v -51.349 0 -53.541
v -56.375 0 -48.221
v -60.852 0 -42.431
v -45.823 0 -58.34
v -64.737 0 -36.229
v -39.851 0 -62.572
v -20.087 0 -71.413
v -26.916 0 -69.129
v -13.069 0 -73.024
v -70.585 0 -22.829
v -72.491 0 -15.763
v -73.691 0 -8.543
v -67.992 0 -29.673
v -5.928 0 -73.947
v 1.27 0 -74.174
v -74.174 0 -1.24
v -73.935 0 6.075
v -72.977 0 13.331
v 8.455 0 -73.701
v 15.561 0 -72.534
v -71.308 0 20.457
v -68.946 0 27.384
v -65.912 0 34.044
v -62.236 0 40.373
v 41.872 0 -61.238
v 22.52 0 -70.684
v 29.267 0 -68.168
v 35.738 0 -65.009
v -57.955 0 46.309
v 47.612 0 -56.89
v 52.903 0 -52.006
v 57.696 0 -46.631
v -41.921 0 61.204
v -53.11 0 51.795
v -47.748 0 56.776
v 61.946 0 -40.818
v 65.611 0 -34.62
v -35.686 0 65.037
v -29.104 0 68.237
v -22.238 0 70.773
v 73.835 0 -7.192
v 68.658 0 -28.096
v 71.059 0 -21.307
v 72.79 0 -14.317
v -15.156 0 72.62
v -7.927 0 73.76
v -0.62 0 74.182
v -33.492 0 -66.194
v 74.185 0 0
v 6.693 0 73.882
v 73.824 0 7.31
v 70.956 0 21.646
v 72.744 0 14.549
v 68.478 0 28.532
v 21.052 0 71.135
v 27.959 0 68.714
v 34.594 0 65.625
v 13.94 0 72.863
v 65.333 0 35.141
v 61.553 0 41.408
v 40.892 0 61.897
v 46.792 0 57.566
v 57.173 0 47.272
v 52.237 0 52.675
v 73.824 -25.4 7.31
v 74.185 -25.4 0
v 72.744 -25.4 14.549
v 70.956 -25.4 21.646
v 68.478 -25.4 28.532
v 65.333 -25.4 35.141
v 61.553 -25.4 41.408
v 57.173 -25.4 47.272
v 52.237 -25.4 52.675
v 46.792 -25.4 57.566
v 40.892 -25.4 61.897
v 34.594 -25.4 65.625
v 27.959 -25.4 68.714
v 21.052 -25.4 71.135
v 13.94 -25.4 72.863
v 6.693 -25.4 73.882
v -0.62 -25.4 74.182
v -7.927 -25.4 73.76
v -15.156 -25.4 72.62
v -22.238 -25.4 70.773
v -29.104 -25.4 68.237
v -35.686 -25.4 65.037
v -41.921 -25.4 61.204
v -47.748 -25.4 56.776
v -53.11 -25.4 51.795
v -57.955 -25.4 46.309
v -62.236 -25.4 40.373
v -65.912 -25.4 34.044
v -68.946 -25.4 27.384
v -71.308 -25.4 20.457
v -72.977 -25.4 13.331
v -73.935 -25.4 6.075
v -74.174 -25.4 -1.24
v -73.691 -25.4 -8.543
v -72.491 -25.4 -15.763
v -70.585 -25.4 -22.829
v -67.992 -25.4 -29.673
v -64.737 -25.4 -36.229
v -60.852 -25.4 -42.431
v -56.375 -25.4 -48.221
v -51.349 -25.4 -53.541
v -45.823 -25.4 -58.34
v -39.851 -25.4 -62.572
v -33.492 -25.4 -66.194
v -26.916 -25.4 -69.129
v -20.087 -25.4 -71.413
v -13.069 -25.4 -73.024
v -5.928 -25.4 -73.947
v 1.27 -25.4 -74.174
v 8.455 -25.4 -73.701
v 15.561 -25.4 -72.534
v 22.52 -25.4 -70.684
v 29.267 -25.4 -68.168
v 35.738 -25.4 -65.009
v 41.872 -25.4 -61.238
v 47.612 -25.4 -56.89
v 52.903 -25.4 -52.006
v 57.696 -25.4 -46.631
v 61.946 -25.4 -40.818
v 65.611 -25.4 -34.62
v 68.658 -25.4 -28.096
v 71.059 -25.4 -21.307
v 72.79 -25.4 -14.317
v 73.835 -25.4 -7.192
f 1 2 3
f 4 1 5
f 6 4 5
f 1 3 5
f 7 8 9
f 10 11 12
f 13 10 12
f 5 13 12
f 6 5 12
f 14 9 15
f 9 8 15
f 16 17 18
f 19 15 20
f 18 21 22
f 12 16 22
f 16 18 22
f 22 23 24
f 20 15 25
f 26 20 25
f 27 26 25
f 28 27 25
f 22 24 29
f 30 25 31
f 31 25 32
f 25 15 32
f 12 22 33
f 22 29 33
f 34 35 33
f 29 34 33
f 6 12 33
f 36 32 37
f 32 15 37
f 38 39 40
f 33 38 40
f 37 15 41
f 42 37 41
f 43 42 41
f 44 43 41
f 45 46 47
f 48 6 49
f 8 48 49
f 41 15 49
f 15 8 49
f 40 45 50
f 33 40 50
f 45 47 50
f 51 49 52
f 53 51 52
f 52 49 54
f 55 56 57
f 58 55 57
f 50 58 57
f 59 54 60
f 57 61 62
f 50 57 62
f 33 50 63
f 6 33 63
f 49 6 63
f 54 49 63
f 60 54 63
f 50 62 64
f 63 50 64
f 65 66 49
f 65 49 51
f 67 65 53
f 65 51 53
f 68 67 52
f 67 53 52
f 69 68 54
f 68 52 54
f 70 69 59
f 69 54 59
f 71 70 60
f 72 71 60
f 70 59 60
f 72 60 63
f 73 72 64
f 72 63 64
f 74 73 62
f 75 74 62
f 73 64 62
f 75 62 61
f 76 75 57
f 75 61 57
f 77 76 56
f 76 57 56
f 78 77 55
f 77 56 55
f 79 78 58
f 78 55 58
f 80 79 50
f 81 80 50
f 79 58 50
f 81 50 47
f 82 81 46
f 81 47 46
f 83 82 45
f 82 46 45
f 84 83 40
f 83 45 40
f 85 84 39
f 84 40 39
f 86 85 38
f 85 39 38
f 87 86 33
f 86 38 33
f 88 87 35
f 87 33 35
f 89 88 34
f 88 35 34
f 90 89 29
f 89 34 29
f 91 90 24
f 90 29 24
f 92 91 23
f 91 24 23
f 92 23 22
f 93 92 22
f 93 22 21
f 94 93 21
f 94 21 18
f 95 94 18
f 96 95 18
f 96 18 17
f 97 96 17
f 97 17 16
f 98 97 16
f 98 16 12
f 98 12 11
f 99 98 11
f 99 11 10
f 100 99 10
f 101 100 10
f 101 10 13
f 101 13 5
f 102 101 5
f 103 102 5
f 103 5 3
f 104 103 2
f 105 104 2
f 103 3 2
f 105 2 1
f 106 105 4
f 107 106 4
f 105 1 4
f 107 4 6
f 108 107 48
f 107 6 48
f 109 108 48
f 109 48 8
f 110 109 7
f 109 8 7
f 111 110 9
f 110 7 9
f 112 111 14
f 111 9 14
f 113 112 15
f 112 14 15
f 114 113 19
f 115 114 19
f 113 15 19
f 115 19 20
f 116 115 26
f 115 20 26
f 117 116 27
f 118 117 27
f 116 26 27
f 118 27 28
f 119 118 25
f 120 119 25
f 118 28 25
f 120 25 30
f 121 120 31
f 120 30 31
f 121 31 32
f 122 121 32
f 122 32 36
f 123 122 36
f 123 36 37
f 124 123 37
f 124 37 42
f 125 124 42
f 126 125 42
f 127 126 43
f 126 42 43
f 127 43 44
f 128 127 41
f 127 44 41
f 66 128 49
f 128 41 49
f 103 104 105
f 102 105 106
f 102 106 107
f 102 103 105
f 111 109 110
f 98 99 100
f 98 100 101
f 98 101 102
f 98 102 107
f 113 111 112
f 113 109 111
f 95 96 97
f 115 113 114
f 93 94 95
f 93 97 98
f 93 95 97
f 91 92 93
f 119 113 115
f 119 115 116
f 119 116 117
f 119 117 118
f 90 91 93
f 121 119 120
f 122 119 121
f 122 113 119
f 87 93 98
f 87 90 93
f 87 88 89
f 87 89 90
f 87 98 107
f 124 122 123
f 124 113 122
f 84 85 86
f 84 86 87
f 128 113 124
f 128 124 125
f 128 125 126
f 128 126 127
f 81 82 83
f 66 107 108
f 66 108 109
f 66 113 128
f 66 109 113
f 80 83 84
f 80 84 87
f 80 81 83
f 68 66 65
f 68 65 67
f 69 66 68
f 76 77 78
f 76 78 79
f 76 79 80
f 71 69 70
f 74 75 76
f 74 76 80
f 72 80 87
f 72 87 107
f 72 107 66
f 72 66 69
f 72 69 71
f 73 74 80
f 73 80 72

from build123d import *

# Parameters (mm, degrees)
F1_DEPTH = 25.4
F0_W     = 2.0122602582
F0_H     = 9.6141556278
F0_W_2   = 9.3905702233
F0_H_2   = 4.6952851117
F0_H_3   = 17.2160472721
F0_W_3   = 2.6830211282
F0_H_4   = 3.1301882118
F0_W_4   = 1.7886832356
F0_H_5   = 10.0613348186


with BuildPart() as f1:
    # F0 (on Front) → F1 (new body)
    with BuildSketch(Plane.XZ):
        with BuildLine():
            ThreePointArc((74.1845954161, 0), (-38.8508509686, 63.1978288873), (-33.4918178247, -66.1940506076))
            ThreePointArc((-33.4918178247, -66.1940506076), (38.8508509686, -63.1978288873), (74.1845954161, 0))
        make_face()
        with BuildLine():
            ThreePointArc((53.2162221936, 0), (27.8696069711, -45.3348796385), (-24.0253115762, -47.4842153586))
            ThreePointArc((-24.0253115762, -47.4842153586), (-27.8696069711, 45.3348796385), (53.2162221936, 0))
        make_face(mode=Mode.SUBTRACT)
        with BuildLine():
            ThreePointArc((53.2162221936, 0), (-27.8696069711, 45.3348796385), (-24.0253115762, -47.4842153586))
            ThreePointArc((-24.0253115762, -47.4842153586), (27.8696069711, -45.3348796385), (53.2162221936, 0))
        make_face()
        with BuildLine():
            ThreePointArc((40.3185295406, 0), (21.1150195491, -34.3473401263), (-18.2024426872, -35.9757543984))
            ThreePointArc((-18.2024426872, -35.9757543984), (-21.1150195491, 34.3473401263), (40.3185295406, 0))
        make_face(mode=Mode.SUBTRACT)
        with BuildLine():
            ThreePointArc((40.3185295406, 0), (-21.1150195491, 34.3473401263), (-18.2024426872, -35.9757543984))
            ThreePointArc((-18.2024426872, -35.9757543984), (21.1150195491, -34.3473401263), (40.3185295406, 0))
        make_face()
        with BuildLine():
            ThreePointArc((30.8835030596, 0), (16.1738480614, -26.3096446216), (-13.9428496234, -27.5569901406))
            ThreePointArc((-13.9428496234, -27.5569901406), (-16.1738480614, 26.3096446216), (30.8835030596, 0))
        make_face(mode=Mode.SUBTRACT)
        with BuildLine():
            ThreePointArc((30.8835030596, 0), (-16.1738480614, 26.3096446216), (-13.9428496234, -27.5569901406))
            ThreePointArc((-13.9428496234, -27.5569901406), (16.1738480614, -26.3096446216), (30.8835030596, 0))
        make_face()
        with BuildLine():
            ThreePointArc((23.2248742524, 0), (12.1629850953, -19.7852616261), (-10.4852395986, -20.723284841))
            ThreePointArc((-10.4852395986, -20.723284841), (-12.1629850953, 19.7852616261), (23.2248742524, 0))
        make_face(mode=Mode.SUBTRACT)
        with BuildLine():
            ThreePointArc((23.2248742524, 0), (-12.1629850953, 19.7852616261), (-10.4852395986, -20.723284841))
            ThreePointArc((-10.4852395986, -20.723284841), (12.1629850953, -19.7852616261), (23.2248742524, 0))
        make_face()
        with BuildLine():
            ThreePointArc((17.4618084215, 0), (9.1448381274, -14.8757080158), (-7.8834116876, -15.5809683111))
            ThreePointArc((-7.8834116876, -15.5809683111), (-9.1448381274, 14.8757080158), (17.4618084215, 0))
        make_face(mode=Mode.SUBTRACT)
        with BuildLine():
            ThreePointArc((17.4618084215, 0), (-9.1448381274, 14.8757080158), (-7.8834116876, -15.5809683111))
            ThreePointArc((-7.8834116876, -15.5809683111), (9.1448381274, -14.8757080158), (17.4618084215, 0))
        make_face()
        with BuildLine():
            ThreePointArc((13.1806981516, 0), (6.902798845, -11.2286317898), (-5.9506362314, -11.760983471))
            ThreePointArc((-5.9506362314, -11.760983471), (-6.902798845, 11.2286317898), (13.1806981516, 0))
        make_face(mode=Mode.SUBTRACT)
        with BuildLine():
            ThreePointArc((13.1806981516, 0), (-6.902798845, 11.2286317898), (-5.9506362314, -11.760983471))
            ThreePointArc((-5.9506362314, -11.760983471), (6.902798845, -11.2286317898), (13.1806981516, 0))
        make_face()
        with BuildLine():
            ThreePointArc((-4.1793532864, -8.2601763927), (-4.8480925259, 7.8862859948), (9.2572948495, 0))
            ThreePointArc((9.2572948495, 0), (4.8480925259, -7.8862859948), (-4.1793532864, -8.2601763927))
        make_face(mode=Mode.SUBTRACT)
        with BuildLine():
            ThreePointArc((-4.1793532864, -8.2601763927), (4.8480925259, -7.8862859948), (9.2572948495, 0))
            ThreePointArc((9.2572948495, 0), (-4.8480925259, 7.8862859948), (-4.1793532864, -8.2601763927))
        make_face()
        with BuildLine():
            ThreePointArc((6.7578094068, 0), (3.5390992519, -5.7569752877), (-3.0509207508, -6.0299146387))
            ThreePointArc((-3.0509207508, -6.0299146387), (-3.5390992519, 5.7569752877), (6.7578094068, 0))
        make_face(mode=Mode.SUBTRACT)
        with BuildLine():
            ThreePointArc((6.7578094068, 0), (-3.5390992519, 5.7569752877), (-3.0509207508, -6.0299146387))
            ThreePointArc((-3.0509207508, -6.0299146387), (3.5390992519, -5.7569752877), (6.7578094068, 0))
        make_face()
        with BuildLine():
            ThreePointArc((5.0579216156, 0), (2.648859346, -4.3088415188), (-2.2834793176, -4.5131245579))
            ThreePointArc((-2.2834793176, -4.5131245579), (-2.648859346, 4.3088415188), (5.0579216156, 0))
        make_face(mode=Mode.SUBTRACT)
        with BuildLine():
            ThreePointArc((5.0579216156, 0), (-2.648859346, 4.3088415188), (-2.2834793176, -4.5131245579))
            ThreePointArc((-2.2834793176, -4.5131245579), (2.648859346, -4.3088415188), (5.0579216156, 0))
        make_face()
        with BuildLine():
            ThreePointArc((2.9671045807, 0), (1.5538878015, -2.5276752745), (-1.3395466475, -2.6475128653))
            ThreePointArc((-1.3395466475, -2.6475128653), (-1.5538878015, 2.5276752745), (2.9671045807, 0))
        make_face(mode=Mode.SUBTRACT)
        with BuildLine():
            ThreePointArc((2.9671045807, 0), (-1.5538878015, 2.5276752745), (-1.3395466475, -2.6475128653))
            ThreePointArc((-1.3395466475, -2.6475128653), (1.5538878015, -2.5276752745), (2.9671045807, 0))
        make_face()
    extrude(amount=F1_DEPTH)


with BuildPart() as f1b:
    # F0 (on Front) → F1, piece 2 (new body)
    with BuildSketch(Plane.XZ):
        Polygon((81.161364913, -32.4920788407), (81.161364913, -71.3958665729), (103.0726954341, -71.3958665729), (103.0726954341, -32.4920788407), (100.3896817565, -32.4920788407), (95.9179773927, -32.4920788407), align=None)
        Polygon((81.161364913, -1.860929653), (81.161364913, -32.4920788407), (95.9179773927, -32.4920788407), (95.9179773927, -11.4750852808), (95.9179773927, -1.860929653), (84.5151394606, -1.860929653), align=None)
        Polygon((84.5151394606, 21.3919151574), (84.5151394606, -1.860929653), (95.9179773927, -1.860929653), (97.9302376509, -1.860929653), (97.9302376509, 16.2494592369), (97.9302376509, 21.3919151574), (87.8689140081, 21.3919151574), align=None)
        Polygon((87.8689140081, 39.5023003221), (87.8689140081, 21.3919151574), (97.9302376509, 21.3919151574), (97.9302376509, 39.5023003221), (95.9179773927, 39.5023003221), (92.8995758295, 39.5023003221), (90.1047661901, 39.5023003221), align=None)
        Polygon((97.9302376509, -11.4750852808), (100.3896817565, -11.4750852808), (100.3896817565, 16.2494592369), (97.9302376509, 16.2494592369), (97.9302376509, -1.860929653), align=None)
        with Locations((96.9241075218, -6.6680074669)):
            Rectangle(F0_W, F0_H)
        Polygon((95.9179773927, -11.4750852808), (95.9179773927, -32.4920788407), (100.3896817565, -32.4920788407), (100.3896817565, -11.4750852808), (97.9302376509, -11.4750852808), align=None)
    extrude(amount=F1_DEPTH)


with BuildPart() as f1c:
    # F0 (on Front) → F1, piece 3 (new body)
    with BuildSketch(Plane.XZ):
        Polygon((-104.4142097235, 19.3796493113), (-104.4142097235, 22.5098375231), (-109.5566675067, 22.5098375231), (-109.5566675067, -30.7033965364), (-87.1981605887, -30.7033965364), (-87.1981605887, 5.7409610599), (-95.0236395001, 5.7409610599), (-95.0236395001, 19.3796493113), align=None)
        with Locations((-99.7189246118, 42.073527351)):
            Rectangle(F0_W_2, F0_H_2)
        Polygon((-87.1981605887, 22.5098375231), (-92.340618372, 22.5098375231), (-92.340618372, 19.3796493113), (-95.0236395001, 19.3796493113), (-95.0236395001, 5.7409610599), (-87.1981605887, 5.7409610599), align=None)
        Polygon((-108.8859140873, 39.7258847952), (-104.4142097235, 39.7258847952), (-104.4142097235, 44.4211699069), (-95.0236395001, 44.4211699069), (-95.0236395001, 54.4825047255), (-108.8859140873, 54.4825047255), align=None)
        Polygon((-93.2349562645, 54.4825047255), (-93.2349562645, 44.4211699069), (-92.340618372, 44.4211699069), (-92.340618372, 22.5098375231), (-87.1981605887, 22.5098375231), (-87.1981605887, 5.7409610599), (-86.5273997188, 5.7409610599), (-86.5273997188, 59.4013724476), (-95.0236395001, 59.4013724476), (-95.0236395001, 54.4825047255), align=None)
        with Locations((-99.7189246118, 31.1178611591)):
            Rectangle(F0_W_2, F0_H_3)
        with Locations((-93.6821289361, 20.9447434172)):
            Rectangle(F0_W_3, F0_H_4)
        with Locations((-99.7189246118, 20.9447434172)):
            Rectangle(F0_W_2, F0_H_4)
        with Locations((-94.1292978823, 42.073527351)):
            Rectangle(F0_W_4, F0_H_2)
        with Locations((-94.1292978823, 49.4518373162)):
            Rectangle(F0_W_4, F0_H_5)
        Polygon((-93.2349562645, 44.4211699069), (-93.2349562645, 39.7258847952), (-95.0236395001, 39.7258847952), (-95.0236395001, 22.5098375231), (-92.340618372, 22.5098375231), (-92.340618372, 44.4211699069), align=None)
    extrude(amount=F1_DEPTH)


solid = f1.part
